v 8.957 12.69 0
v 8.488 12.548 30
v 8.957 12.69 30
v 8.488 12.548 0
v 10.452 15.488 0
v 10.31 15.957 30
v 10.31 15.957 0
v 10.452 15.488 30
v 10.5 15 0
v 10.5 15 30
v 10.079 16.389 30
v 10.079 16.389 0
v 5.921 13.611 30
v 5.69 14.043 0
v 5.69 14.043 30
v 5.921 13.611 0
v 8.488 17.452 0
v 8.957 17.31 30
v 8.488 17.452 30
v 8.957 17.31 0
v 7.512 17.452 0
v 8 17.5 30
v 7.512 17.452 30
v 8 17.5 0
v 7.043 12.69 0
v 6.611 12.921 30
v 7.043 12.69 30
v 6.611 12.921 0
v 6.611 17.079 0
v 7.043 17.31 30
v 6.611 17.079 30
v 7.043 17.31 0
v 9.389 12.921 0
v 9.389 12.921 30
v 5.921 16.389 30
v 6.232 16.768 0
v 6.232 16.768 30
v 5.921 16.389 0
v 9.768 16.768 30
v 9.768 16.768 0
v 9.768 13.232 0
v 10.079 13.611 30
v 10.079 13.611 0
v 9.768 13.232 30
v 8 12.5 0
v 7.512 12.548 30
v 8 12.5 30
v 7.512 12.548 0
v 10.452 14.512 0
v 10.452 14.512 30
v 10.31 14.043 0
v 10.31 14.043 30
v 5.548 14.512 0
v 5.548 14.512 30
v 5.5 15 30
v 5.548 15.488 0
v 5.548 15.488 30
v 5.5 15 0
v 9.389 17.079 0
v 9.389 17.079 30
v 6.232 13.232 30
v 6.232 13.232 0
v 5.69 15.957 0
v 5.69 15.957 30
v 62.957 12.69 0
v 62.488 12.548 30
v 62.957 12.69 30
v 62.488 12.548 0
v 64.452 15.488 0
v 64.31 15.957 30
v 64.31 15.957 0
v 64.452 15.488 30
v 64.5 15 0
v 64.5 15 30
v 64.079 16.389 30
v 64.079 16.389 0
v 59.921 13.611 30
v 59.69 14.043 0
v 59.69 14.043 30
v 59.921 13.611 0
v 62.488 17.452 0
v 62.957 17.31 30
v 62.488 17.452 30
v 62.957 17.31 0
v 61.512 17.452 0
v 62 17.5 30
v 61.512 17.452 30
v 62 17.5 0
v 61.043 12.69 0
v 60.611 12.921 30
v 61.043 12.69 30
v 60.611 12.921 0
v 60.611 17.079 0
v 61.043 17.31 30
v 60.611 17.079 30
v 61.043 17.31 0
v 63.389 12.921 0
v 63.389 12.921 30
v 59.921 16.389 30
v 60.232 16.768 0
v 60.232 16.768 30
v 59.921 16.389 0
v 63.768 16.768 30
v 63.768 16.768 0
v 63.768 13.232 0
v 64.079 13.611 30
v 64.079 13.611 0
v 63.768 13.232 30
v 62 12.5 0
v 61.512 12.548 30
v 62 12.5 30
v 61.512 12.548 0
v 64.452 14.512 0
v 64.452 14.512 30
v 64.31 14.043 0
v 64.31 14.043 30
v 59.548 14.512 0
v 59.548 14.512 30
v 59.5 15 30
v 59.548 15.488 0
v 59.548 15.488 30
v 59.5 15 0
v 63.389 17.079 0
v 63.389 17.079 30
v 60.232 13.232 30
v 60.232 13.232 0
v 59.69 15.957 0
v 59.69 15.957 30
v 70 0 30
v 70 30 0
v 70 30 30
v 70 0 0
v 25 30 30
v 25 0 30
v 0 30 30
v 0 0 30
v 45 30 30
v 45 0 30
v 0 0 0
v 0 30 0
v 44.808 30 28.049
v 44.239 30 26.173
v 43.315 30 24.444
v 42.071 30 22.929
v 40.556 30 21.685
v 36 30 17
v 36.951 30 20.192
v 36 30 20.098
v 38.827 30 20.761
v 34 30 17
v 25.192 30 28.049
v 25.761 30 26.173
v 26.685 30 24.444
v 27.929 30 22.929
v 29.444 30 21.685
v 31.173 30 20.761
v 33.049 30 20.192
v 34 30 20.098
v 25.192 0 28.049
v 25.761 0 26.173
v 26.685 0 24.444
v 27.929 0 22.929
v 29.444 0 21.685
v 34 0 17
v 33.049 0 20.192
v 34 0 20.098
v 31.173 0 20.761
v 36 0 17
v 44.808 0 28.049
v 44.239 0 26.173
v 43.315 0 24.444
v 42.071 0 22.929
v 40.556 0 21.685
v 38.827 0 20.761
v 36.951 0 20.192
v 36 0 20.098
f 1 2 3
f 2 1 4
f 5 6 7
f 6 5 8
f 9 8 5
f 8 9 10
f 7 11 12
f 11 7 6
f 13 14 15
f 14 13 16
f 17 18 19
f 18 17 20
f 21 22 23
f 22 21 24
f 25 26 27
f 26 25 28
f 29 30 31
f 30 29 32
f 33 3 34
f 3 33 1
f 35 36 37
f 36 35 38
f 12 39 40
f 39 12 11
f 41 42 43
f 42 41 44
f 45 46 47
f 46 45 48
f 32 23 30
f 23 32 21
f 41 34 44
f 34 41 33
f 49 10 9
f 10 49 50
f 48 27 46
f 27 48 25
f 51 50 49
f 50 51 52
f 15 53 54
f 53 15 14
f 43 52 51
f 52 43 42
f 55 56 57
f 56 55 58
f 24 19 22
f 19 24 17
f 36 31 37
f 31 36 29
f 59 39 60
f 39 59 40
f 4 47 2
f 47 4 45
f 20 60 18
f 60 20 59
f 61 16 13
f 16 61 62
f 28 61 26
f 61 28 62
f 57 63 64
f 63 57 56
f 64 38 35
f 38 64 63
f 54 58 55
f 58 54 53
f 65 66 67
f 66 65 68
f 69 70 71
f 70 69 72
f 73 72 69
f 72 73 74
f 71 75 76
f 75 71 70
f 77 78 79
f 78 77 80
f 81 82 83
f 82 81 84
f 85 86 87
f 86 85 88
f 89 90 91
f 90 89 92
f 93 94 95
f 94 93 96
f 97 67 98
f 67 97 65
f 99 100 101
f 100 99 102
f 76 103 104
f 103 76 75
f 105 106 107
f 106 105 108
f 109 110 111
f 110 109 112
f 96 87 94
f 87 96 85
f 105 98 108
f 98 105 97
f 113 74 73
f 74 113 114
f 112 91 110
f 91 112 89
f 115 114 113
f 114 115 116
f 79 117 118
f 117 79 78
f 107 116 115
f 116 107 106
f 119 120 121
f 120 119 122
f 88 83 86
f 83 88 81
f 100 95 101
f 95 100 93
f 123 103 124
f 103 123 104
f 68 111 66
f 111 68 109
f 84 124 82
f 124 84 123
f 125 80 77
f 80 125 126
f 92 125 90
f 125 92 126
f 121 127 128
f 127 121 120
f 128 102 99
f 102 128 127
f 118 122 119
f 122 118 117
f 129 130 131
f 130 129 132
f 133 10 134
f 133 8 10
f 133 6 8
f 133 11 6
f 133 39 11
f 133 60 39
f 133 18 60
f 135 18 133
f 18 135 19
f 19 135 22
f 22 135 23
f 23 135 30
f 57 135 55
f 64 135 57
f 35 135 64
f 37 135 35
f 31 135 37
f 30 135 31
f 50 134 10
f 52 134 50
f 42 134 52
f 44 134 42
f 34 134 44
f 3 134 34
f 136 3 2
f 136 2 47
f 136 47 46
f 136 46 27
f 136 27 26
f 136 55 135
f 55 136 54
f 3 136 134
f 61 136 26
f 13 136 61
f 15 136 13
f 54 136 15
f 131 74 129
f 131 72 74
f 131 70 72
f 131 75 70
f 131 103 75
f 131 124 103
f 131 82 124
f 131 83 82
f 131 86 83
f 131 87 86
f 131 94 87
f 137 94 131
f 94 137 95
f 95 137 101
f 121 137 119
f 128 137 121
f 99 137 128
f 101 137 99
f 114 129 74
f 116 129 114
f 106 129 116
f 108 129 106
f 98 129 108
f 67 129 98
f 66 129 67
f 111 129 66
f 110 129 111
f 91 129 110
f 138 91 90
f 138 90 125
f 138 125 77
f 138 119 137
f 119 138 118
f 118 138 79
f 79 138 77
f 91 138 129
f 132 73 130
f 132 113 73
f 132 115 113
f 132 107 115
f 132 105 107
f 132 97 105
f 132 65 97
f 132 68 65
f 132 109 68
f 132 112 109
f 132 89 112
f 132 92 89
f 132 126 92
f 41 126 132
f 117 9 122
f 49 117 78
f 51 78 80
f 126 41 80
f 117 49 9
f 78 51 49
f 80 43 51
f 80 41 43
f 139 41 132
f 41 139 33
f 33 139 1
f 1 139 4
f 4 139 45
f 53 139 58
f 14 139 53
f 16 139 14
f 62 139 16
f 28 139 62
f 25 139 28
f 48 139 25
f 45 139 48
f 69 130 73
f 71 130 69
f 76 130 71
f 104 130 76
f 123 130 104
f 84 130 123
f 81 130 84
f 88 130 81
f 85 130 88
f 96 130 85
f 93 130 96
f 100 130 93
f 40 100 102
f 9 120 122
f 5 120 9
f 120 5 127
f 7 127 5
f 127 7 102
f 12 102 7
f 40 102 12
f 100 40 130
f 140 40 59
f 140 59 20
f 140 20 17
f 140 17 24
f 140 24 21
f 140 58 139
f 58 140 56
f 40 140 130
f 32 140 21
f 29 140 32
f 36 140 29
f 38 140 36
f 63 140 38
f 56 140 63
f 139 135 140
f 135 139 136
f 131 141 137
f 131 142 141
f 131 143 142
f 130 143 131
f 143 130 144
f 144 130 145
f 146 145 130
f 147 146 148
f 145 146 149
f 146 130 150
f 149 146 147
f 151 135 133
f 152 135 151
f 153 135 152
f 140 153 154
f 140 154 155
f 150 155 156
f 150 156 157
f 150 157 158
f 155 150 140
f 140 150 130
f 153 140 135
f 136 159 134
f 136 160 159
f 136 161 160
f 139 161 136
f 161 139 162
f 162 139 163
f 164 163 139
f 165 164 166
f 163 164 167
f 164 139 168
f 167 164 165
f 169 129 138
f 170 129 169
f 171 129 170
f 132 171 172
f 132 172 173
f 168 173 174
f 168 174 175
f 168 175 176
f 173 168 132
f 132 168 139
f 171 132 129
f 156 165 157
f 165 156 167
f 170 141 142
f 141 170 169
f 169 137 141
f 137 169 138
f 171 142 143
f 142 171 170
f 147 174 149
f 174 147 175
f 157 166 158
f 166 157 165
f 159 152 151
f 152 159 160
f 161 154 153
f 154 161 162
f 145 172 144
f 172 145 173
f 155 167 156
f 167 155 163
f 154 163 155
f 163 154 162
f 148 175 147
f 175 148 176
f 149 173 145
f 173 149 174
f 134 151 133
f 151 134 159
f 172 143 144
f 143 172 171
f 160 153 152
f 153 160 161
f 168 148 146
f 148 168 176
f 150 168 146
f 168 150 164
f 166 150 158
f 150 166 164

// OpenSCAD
$fn = 32;

// ----------------------------------------------------------------------
// Saddle clamp: split shaft clamp
// ----------------------------------------------------------------------

// --- parameters (mm) ---
blk_l = 70;               // block length, X
blk_w = 30;               // block width, Y
blk_h = 30;               // block height
clamp_r = 10;             // shaft groove radius
hole_r = 2.5;             // bolt hole radius
hole_m = 8;               // bolt hole margin from the ends
saw_w = 2;                // saw kerf width

saw_depth = clamp_r + 3;  // saw kerf depth

difference() {
  cube([blk_l, blk_w, blk_h]);
  translate([blk_l / 2, -1, blk_h])
    rotate([-90, 0, 0])
      cylinder(h = blk_w + 2, r = clamp_r);
  for (sx = [0, 1])
    translate([sx ? blk_l - hole_m : hole_m, blk_w / 2, -1])
      cylinder(r = hole_r, h = blk_h + 2);
  translate([blk_l / 2 - saw_w / 2, -1, blk_h - saw_depth])
    cube([saw_w, blk_w + 2, saw_depth + 1]);
}
